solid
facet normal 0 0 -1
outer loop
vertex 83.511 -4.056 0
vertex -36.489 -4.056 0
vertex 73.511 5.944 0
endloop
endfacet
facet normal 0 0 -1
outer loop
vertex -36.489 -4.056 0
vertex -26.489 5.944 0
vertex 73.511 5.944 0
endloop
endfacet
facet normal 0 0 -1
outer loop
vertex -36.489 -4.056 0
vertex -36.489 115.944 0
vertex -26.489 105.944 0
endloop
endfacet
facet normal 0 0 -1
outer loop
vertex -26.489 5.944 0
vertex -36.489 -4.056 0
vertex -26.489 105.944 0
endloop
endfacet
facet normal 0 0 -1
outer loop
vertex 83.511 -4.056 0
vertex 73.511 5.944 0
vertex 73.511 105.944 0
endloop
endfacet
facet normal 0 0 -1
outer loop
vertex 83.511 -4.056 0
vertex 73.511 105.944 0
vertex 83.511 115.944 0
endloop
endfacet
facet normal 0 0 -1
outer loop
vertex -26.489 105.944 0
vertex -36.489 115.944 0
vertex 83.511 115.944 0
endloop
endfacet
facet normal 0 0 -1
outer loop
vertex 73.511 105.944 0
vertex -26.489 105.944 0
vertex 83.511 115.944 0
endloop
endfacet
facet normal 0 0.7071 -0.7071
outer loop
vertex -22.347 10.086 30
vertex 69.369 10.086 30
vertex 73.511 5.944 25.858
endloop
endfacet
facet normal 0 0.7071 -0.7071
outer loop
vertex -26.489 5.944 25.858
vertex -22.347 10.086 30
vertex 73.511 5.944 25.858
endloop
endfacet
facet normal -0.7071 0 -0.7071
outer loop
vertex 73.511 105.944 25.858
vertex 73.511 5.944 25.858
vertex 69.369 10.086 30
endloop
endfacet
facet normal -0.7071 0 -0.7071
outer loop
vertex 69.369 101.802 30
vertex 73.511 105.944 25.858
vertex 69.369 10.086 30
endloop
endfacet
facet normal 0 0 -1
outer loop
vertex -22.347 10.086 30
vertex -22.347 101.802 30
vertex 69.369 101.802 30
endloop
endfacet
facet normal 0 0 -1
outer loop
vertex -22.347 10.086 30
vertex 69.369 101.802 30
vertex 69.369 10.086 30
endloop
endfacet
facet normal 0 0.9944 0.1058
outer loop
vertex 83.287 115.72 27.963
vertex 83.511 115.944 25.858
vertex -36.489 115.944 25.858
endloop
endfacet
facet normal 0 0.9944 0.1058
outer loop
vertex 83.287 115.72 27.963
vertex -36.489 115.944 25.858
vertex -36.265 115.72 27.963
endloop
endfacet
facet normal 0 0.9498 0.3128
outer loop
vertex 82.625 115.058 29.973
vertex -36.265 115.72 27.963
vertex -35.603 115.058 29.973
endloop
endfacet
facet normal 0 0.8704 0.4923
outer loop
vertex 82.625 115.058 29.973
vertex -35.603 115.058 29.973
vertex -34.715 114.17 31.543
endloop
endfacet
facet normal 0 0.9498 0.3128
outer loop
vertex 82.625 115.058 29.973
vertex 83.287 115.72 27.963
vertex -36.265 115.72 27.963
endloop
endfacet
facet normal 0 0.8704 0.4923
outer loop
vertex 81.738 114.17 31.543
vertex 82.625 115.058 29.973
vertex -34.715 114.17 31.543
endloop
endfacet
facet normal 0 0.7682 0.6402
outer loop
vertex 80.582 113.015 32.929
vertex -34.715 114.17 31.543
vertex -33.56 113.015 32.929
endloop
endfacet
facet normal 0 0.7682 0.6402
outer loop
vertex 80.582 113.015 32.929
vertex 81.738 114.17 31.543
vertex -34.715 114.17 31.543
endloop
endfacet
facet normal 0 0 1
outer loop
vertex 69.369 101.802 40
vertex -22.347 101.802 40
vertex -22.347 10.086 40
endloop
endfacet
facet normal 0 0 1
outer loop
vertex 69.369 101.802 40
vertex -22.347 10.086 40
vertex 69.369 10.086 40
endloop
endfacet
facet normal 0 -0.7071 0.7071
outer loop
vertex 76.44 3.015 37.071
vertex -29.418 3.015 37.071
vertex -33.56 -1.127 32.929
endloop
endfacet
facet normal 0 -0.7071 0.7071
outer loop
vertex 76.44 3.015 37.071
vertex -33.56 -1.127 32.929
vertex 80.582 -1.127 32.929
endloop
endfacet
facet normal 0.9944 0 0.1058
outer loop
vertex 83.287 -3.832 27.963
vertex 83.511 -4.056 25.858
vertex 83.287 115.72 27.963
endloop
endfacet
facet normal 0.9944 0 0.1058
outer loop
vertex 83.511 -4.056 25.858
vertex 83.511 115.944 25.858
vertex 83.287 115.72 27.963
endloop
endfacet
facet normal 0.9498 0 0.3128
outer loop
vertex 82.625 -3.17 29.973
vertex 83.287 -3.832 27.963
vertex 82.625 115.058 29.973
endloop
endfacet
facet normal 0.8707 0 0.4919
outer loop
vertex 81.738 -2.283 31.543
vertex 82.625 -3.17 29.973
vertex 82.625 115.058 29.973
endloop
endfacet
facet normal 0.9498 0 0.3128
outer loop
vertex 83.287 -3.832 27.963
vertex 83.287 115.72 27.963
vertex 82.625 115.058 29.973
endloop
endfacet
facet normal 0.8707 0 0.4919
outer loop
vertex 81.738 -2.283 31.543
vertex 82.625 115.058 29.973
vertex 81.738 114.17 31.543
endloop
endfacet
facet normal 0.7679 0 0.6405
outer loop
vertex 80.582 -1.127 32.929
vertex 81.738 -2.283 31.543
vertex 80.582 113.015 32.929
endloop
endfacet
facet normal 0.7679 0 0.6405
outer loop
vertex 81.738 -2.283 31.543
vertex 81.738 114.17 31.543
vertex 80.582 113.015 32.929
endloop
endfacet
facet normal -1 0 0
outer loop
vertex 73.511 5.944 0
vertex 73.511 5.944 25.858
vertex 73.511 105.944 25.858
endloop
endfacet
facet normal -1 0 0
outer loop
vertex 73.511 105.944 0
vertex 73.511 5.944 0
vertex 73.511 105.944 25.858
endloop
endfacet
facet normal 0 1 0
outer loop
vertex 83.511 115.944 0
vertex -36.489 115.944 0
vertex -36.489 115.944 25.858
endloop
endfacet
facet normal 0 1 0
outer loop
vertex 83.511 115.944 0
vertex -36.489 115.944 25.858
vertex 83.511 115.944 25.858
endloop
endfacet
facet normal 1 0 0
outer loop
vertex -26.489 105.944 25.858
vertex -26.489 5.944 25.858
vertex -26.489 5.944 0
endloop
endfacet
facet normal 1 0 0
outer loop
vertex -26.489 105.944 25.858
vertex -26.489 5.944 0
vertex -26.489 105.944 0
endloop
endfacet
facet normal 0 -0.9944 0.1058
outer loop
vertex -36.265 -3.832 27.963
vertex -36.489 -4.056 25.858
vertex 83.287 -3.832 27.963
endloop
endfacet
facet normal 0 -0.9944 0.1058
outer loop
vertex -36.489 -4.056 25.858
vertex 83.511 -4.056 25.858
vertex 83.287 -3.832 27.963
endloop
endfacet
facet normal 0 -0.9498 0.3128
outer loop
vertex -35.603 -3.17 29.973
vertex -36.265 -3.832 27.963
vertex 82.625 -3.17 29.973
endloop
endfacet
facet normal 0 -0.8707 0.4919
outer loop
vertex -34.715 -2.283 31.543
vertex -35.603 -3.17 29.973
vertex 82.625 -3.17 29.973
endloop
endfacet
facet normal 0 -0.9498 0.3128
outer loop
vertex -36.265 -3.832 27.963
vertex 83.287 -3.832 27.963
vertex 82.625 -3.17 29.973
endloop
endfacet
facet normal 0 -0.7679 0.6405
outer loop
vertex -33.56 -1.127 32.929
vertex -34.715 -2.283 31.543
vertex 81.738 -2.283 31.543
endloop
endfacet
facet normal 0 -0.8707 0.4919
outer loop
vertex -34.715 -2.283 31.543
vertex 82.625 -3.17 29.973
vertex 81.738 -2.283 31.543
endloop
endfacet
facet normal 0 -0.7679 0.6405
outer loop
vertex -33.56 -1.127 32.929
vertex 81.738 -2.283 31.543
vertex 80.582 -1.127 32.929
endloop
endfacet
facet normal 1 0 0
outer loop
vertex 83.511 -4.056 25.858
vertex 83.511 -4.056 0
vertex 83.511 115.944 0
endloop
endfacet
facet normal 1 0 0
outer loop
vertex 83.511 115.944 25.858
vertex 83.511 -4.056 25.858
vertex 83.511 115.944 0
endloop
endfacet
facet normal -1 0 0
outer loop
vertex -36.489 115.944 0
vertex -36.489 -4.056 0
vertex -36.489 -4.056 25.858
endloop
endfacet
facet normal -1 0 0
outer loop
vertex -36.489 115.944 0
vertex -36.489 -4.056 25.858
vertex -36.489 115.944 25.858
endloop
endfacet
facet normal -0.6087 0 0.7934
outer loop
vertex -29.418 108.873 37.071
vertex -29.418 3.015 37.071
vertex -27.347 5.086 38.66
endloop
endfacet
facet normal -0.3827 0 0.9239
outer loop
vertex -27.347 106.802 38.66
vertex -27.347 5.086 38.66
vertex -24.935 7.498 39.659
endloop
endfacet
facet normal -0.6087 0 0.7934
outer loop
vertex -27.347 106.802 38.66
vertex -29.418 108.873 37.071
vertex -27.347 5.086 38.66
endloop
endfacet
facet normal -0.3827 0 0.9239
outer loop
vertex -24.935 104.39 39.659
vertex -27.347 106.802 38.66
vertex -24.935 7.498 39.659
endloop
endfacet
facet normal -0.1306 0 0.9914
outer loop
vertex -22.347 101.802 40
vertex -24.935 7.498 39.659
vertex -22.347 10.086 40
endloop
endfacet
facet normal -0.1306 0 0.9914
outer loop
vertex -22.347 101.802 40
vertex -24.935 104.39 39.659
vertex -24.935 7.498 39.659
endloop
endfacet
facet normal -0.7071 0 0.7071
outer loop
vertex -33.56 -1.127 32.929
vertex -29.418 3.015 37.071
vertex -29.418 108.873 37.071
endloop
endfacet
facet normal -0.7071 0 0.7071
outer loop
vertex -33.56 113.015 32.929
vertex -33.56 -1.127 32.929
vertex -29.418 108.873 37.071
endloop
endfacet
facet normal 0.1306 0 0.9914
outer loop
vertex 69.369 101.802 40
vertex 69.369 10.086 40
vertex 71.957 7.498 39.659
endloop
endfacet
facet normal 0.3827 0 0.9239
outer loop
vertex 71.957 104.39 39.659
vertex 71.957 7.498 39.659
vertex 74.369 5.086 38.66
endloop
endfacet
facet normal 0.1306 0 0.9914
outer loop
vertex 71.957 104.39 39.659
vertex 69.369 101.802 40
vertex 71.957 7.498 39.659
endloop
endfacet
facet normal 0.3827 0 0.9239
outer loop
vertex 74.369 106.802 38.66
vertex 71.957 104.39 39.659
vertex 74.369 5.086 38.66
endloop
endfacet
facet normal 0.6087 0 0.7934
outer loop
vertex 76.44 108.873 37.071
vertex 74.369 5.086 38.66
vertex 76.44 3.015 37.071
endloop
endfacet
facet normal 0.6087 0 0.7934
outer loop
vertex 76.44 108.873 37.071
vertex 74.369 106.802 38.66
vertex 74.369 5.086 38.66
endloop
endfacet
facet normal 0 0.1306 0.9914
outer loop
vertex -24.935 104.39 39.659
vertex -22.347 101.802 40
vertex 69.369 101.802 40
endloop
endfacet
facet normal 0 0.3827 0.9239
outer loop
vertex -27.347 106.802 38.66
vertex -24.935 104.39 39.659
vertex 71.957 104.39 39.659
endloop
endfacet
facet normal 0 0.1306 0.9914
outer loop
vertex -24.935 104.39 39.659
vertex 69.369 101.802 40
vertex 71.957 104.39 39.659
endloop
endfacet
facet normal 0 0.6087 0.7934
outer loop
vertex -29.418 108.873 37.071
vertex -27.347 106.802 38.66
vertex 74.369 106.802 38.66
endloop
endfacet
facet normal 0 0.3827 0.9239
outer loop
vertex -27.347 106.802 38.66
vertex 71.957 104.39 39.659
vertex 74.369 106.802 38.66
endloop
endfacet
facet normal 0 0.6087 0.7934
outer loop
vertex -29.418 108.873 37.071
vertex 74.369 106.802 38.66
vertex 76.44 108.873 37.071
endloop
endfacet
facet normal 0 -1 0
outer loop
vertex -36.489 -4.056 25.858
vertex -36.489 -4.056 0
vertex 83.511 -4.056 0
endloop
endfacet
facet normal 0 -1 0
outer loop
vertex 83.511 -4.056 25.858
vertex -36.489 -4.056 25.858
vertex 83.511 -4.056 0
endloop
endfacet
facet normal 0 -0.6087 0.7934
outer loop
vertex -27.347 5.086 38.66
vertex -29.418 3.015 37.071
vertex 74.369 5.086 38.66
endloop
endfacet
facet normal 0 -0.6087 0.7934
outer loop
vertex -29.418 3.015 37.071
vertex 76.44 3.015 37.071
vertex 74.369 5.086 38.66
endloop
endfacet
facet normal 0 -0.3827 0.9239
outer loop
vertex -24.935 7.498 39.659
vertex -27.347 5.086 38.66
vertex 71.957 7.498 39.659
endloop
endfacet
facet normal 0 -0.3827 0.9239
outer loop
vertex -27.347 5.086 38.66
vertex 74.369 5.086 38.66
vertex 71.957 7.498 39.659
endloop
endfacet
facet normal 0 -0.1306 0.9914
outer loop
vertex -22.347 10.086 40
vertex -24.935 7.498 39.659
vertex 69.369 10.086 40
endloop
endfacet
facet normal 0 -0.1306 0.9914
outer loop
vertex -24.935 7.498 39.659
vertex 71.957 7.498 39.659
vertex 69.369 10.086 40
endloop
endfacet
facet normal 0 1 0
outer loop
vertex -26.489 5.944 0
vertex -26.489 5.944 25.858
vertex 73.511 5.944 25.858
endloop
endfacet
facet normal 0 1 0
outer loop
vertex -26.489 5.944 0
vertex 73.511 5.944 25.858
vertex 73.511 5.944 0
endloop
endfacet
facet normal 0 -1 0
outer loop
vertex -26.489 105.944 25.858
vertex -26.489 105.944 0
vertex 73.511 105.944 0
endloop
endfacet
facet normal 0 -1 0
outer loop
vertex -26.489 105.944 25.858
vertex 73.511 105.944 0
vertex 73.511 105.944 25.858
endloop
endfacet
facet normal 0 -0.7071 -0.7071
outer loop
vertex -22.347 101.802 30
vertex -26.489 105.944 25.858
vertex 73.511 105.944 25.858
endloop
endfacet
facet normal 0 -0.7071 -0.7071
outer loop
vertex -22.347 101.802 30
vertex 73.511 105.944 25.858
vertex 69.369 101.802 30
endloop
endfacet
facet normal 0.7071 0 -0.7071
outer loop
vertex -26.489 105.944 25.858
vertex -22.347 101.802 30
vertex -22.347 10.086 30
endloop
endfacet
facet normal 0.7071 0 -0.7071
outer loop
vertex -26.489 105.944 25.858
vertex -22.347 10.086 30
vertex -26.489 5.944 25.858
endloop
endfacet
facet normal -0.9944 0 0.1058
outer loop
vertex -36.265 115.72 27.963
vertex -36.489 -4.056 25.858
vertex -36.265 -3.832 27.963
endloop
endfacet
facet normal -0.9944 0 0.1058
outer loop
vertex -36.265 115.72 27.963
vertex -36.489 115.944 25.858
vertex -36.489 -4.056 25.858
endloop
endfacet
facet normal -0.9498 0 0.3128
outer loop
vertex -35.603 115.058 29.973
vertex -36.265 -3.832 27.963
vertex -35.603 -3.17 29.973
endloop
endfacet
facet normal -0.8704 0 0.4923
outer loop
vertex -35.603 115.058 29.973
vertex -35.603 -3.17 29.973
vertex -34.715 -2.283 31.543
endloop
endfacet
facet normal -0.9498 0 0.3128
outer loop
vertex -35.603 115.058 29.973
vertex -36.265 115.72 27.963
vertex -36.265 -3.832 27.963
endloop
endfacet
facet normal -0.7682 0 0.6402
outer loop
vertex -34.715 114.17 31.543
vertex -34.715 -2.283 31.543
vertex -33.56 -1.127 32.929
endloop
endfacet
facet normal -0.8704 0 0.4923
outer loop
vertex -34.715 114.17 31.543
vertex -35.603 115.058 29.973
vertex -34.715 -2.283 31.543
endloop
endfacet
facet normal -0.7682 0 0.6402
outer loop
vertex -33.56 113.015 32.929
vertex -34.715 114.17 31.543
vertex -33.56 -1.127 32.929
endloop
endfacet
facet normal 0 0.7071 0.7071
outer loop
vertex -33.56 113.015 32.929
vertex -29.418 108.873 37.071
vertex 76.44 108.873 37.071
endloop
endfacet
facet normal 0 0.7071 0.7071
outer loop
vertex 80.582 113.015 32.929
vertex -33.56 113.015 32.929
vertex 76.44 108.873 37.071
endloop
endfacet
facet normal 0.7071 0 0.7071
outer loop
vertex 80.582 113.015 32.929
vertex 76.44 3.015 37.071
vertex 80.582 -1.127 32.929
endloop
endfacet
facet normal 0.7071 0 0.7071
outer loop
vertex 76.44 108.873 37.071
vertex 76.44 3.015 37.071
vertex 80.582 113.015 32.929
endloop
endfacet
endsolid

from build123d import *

# Parameters (mm, degrees)
SKETCH1_W           = 120
SKETCH1_H           = 120
BOSS_EXTRUDE1_DEPTH = 40
CHAMFER1_SIZE       = 10
FILLET1_R           = 10
SHELL1_START        = -26.488905171
SHELL1_DEPTH        = 100
SHELL1_START_2      = 5
SHELL1_2_DEPTH      = 102


with BuildPart() as part:
    # Sketch1 → Boss-Extrude1 (new body)
    with BuildSketch(Plane.XY):
        with Locations((23.511094829, 55.943688507)):
            Rectangle(SKETCH1_W, SKETCH1_H)
    extrude(amount=BOSS_EXTRUDE1_DEPTH)

    # Chamfer1
    chamfer1_edges = [part.edges().sort_by_distance(p)[0] for p in [
        (83.511094829, 55.943688507, 40),
        (23.511094829, 115.943688507, 40),
        (-36.488905171, 55.943688507, 40),
        (23.511094829, -4.056311493, 40),
    ]]
    chamfer(chamfer1_edges, length=CHAMFER1_SIZE)

    # Fillet1
    fillet1_edges = [part.edges().sort_by_distance(p)[0] for p in [
        (-26.488905171, 55.943688507, 40),
        (23.511094829, 105.943688507, 40),
        (73.511094829, 55.943688507, 40),
        (23.511094829, 5.943688507, 40),
        (23.511094829, -4.056311493, 30),
        (83.511094829, 55.943688507, 30),
        (23.511094829, 115.943688507, 30),
        (-36.488905171, 55.943688507, 30),
    ]]
    fillet(fillet1_edges, radius=FILLET1_R)

    # Shell1: read off the stored shape, not the designer's step
    # Shell1 outline → Shell1 (cut)
    with BuildSketch(Plane.YZ.offset(SHELL1_START)):
        Polygon((5.943688507, 25.857864376), (5.943688507, 0), (105.943688507, 0), (105.943688507, 25.857864376), (101.801552884, 30), (10.085824131, 30), align=None)
    extrude(amount=SHELL1_DEPTH, mode=Mode.SUBTRACT)

    # Shell1 2 outline → Shell1 2 (add)
    with BuildSketch(Plane(origin=(0, 0, 0), x_dir=(1, 0, 0), z_dir=(0, 1, 0)).offset(SHELL1_START_2)):
        Polygon((73.511094829, -25.857864376), (69.368959206, -30), (73.511094829, -30), align=None)
        Polygon((-22.346769547, -30), (-26.488905171, -25.857864376), (-26.488905171, -30), align=None)
    extrude(amount=SHELL1_2_DEPTH)


solid = part.part
